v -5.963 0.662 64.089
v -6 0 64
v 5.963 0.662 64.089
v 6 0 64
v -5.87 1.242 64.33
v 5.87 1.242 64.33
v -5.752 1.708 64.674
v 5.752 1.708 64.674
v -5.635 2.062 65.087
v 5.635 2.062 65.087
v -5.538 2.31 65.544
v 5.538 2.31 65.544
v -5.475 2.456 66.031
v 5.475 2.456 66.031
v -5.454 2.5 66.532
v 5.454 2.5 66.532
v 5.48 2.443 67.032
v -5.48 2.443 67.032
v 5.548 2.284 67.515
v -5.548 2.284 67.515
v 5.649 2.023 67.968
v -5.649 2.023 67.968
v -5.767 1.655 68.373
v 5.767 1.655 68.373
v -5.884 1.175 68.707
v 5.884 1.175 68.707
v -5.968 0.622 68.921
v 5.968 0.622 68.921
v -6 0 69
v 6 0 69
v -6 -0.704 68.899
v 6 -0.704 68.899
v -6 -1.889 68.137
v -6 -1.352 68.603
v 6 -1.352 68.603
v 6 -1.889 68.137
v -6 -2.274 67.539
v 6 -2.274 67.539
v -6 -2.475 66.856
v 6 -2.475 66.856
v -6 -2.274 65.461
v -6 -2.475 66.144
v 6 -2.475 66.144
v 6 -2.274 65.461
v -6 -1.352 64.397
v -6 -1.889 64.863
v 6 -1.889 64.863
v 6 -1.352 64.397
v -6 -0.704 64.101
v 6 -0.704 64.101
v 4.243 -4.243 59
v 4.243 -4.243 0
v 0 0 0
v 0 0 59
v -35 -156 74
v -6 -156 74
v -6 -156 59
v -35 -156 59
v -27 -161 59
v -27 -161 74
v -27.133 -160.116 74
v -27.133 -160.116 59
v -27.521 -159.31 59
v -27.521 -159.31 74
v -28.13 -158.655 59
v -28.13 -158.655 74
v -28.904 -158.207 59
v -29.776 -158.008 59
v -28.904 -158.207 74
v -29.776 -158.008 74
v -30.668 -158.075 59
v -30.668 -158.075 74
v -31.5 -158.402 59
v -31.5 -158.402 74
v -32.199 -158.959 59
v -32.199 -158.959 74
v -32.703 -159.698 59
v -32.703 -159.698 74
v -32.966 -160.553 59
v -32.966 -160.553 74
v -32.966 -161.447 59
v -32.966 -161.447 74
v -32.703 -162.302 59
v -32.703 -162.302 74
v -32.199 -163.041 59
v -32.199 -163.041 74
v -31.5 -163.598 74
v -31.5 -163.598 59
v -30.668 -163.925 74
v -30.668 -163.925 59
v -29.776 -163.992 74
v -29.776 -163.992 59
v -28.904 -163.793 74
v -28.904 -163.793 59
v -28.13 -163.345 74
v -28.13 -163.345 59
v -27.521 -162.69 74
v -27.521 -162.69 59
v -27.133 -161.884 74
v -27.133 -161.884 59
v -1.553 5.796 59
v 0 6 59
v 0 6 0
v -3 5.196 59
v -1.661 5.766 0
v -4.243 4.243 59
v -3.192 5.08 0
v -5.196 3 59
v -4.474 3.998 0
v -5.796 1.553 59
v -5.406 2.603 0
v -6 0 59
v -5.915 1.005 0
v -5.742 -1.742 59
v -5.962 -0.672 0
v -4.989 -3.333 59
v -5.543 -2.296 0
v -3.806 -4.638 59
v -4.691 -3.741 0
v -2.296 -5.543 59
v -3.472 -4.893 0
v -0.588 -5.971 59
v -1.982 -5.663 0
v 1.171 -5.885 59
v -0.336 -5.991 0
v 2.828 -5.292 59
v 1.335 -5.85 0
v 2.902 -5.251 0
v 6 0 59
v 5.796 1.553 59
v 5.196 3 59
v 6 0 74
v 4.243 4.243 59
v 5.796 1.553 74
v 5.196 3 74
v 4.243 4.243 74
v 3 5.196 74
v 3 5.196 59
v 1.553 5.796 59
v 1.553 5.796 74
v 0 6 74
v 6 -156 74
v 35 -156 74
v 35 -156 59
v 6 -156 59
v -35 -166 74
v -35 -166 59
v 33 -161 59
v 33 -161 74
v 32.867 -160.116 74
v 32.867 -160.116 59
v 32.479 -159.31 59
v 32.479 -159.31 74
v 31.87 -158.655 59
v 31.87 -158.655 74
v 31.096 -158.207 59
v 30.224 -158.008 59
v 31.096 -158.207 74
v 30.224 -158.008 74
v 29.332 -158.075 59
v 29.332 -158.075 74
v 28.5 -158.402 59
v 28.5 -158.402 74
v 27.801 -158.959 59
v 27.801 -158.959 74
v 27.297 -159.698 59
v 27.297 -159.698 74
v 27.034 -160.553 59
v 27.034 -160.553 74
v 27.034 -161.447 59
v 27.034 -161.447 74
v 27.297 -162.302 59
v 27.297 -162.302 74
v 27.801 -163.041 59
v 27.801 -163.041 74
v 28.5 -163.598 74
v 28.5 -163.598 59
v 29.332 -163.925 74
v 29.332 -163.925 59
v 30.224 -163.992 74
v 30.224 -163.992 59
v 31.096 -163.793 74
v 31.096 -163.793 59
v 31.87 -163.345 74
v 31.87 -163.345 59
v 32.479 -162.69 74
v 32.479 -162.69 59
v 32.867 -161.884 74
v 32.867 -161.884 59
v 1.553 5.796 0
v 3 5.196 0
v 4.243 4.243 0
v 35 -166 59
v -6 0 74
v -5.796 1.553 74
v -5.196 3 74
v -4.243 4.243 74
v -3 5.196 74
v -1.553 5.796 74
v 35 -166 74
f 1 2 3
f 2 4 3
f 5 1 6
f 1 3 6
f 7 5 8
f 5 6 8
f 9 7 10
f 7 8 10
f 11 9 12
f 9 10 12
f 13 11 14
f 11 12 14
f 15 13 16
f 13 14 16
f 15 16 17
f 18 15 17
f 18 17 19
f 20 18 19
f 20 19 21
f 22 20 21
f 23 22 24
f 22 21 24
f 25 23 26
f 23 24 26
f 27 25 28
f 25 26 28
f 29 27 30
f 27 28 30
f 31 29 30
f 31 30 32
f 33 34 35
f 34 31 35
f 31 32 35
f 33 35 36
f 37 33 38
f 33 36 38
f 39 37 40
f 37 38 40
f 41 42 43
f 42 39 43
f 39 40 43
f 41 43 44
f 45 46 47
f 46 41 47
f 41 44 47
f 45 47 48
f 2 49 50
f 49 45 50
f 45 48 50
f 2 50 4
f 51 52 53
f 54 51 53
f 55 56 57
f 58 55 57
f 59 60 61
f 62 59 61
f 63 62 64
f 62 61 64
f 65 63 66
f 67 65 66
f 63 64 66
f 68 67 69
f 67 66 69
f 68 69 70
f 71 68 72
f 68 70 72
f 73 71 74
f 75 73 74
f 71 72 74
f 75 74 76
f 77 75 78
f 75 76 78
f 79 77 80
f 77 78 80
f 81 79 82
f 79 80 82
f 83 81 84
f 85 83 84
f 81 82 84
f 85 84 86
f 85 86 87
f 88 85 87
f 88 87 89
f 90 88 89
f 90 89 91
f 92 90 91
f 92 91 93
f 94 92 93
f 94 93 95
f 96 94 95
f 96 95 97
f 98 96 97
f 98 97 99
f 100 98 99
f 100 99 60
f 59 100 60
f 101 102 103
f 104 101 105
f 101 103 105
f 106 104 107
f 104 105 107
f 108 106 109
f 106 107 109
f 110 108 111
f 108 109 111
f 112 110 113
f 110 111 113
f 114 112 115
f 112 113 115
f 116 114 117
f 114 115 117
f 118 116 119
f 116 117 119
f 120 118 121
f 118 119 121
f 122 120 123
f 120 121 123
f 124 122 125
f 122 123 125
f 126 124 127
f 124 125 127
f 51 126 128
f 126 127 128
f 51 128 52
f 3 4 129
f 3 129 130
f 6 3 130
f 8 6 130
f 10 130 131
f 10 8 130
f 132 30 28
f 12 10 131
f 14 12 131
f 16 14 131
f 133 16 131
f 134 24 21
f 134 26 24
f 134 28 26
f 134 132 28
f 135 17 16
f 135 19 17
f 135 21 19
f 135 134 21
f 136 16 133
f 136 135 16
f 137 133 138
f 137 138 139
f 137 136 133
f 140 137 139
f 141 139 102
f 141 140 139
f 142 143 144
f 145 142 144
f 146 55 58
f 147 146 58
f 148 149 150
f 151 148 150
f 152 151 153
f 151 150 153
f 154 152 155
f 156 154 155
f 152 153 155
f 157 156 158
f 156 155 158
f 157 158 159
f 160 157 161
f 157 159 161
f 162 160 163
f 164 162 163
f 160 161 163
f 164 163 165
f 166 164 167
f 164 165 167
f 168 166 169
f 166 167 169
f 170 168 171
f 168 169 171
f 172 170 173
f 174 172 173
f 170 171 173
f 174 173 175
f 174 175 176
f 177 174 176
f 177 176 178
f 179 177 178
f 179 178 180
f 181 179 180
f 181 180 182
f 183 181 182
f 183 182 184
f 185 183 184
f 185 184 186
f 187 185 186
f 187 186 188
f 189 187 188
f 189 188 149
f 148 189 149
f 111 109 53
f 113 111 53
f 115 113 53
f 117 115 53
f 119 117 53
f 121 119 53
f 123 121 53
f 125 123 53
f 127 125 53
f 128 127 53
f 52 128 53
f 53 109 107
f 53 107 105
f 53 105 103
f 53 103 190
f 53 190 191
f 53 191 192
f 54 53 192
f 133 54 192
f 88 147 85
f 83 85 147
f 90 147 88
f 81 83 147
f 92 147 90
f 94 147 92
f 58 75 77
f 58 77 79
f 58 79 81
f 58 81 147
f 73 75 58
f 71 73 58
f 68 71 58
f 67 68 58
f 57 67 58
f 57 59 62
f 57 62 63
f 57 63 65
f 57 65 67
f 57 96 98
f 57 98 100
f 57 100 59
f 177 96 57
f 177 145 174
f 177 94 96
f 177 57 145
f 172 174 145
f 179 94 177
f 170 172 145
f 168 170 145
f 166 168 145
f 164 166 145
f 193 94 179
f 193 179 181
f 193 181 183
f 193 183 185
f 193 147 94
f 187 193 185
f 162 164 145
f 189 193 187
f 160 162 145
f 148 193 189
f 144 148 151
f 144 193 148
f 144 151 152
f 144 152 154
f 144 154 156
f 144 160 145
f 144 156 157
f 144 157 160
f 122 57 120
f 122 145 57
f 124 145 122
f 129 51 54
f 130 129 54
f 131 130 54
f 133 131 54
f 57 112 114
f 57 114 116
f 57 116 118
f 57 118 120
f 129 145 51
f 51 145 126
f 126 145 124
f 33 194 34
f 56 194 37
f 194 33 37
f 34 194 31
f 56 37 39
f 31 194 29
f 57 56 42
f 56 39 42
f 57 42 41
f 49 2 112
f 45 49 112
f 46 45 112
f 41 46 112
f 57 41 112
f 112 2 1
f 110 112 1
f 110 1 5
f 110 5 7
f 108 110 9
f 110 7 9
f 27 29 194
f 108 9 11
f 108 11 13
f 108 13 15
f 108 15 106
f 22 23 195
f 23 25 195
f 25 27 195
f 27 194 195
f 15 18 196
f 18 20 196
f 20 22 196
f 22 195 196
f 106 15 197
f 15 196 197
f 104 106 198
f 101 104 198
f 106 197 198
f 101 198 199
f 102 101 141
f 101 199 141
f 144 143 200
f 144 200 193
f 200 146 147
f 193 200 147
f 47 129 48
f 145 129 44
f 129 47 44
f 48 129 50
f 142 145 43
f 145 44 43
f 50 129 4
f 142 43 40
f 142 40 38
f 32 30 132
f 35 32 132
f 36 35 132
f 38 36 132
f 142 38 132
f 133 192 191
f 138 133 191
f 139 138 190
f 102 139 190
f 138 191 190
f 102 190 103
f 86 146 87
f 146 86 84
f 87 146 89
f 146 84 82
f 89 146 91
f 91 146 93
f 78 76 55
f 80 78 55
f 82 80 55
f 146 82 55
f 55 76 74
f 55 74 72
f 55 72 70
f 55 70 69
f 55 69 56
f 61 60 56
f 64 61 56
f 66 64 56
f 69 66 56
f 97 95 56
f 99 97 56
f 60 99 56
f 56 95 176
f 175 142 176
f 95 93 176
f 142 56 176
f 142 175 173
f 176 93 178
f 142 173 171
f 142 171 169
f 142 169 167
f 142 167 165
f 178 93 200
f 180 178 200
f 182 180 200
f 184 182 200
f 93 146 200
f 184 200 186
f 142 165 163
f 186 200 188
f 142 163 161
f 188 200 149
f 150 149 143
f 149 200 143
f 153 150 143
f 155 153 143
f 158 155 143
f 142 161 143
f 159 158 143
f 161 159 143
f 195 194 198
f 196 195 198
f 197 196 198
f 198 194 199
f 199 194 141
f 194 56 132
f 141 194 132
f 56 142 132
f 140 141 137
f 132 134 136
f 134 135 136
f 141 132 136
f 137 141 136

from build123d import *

# Parameters (mm, degrees)
BOSS_EXTRU_1_DEPTH      = 59
BOSS_EXTRU_2_DEPTH      = 15
CONG_1_R                = 6
BOSS_EXTRU_3_DEPTH      = 150
ESQUISSE5_W             = 15
ESQUISSE5_H             = 10
BOSS_EXTRU_4_DEPTH      = 35
ENL_V_MAT_EXTRU_1_REACH = 187.086
ESQUISSE6_R             = 3
ENL_V_MAT_EXTRU_2_REACH = 188.314


with BuildPart() as part:
    # Esquisse1 → Boss.-Extru.1 (new body)
    with BuildSketch(Plane.XY):
        with BuildLine():
            Line((4.242640687, -4.242640687), (0, 0))
            Line((0, 0), (0, 6))
            ThreePointArc((0, 6), (-5.543277195, -2.296100594), (4.242640687, -4.242640687))
        make_face()
        with BuildLine():
            Line((0, 6), (0, 0))
            Line((0, 0), (4.242640687, 4.242640687))
            ThreePointArc((4.242640687, 4.242640687), (2.296100594, 5.543277195), (0, 6))
        make_face()
    extrude(amount=BOSS_EXTRU_1_DEPTH)

    # Esquisse2 → Boss.-Extru.2 (add)
    with BuildSketch(Plane.XY.offset(59)):
        with BuildLine():
            ThreePointArc((0, -6), (-4.242640708, -4.242640666), (-6, 5.9e-08))
            Line((-6, 5.9e-08), (-6, -6))
            Line((-6, -6), (0, -6))
        make_face()
        with BuildLine():
            Line((0, 0), (0, 6))
            ThreePointArc((0, 6), (-4.242640666, 4.242640708), (-6, 5.9e-08))
            ThreePointArc((-6, 5.9e-08), (-4.242640708, -4.242640666), (0, -6))
            Line((0, -6), (0, 0))
        make_face()
        with BuildLine():
            ThreePointArc((4.242640687, 4.242640687), (2.296100594, 5.543277195), (0, 6))
            Line((0, 6), (0, 0))
            Line((0, 0), (4.242640687, 4.242640687))
        make_face()
        with BuildLine():
            Line((6, 6), (0, 6))
            ThreePointArc((0, 6), (2.296100594, 5.543277195), (4.242640687, 4.242640687))
            Line((4.242640687, 4.242640687), (0, 0))
            Line((0, 0), (4.242640687, -4.242640687))
            ThreePointArc((4.242640687, -4.242640687), (2.296100594, -5.543277195), (0, -6))
            Line((0, -6), (6, -6))
            Line((6, -6), (6, 6))
        make_face()
        with BuildLine():
            ThreePointArc((-6, 5.9e-08), (-4.242640666, 4.242640708), (0, 6))
            Line((0, 6), (-6, 6))
            Line((-6, 6), (-6, 5.9e-08))
        make_face()
        with BuildLine():
            Line((4.242640687, -4.242640687), (0, 0))
            Line((0, 0), (0, -6))
            ThreePointArc((0, -6), (2.296100594, -5.543277195), (4.242640687, -4.242640687))
        make_face()
    extrude(amount=BOSS_EXTRU_2_DEPTH)

    # Congé1
    cong_1_edges = [part.edges().sort_by_distance(p)[0] for p in [
        (6, 6, 66.5),
        (-6, 6, 66.5),
    ]]
    fillet(cong_1_edges, radius=CONG_1_R - 0.0001)  # a hair under: the kernel refuses the full size

    # Esquisse4 → Boss.-Extru.3 (add)
    with BuildSketch(Plane.XZ.offset(6)):
        Polygon((0, 59), (6, 59), (6, 74), (-6, 74), (-6, 59), align=None)
    extrude(amount=BOSS_EXTRU_3_DEPTH)

    # Esquisse5 → Boss.-Extru.4 (add, symmetric)
    with BuildSketch(Plane(origin=(0, 0, 0), x_dir=(0, 0, -1), z_dir=(1, 0, 0))):
        with Locations((-66.5, -161)):
            Rectangle(ESQUISSE5_W, ESQUISSE5_H)
    extrude(amount=BOSS_EXTRU_4_DEPTH, both=True)

    # Esquisse6 → Enlèv. mat.-Extru.1 (cut, up to next)
    with BuildSketch(Plane.XY.offset(74), mode=Mode.PRIVATE) as enl_v_mat_extru_1_sk1:
        with Locations((-30, -161)):
            Circle(ESQUISSE6_R)
    enl_v_mat_extru_1_tool1 = extrude(enl_v_mat_extru_1_sk1.sketch, amount=-ENL_V_MAT_EXTRU_1_REACH, mode=Mode.PRIVATE) & part.part
    # Esquisse6 → Enlèv. mat.-Extru.1 (cut, up to next)
    with BuildSketch(Plane.XY.offset(74), mode=Mode.PRIVATE) as enl_v_mat_extru_1_sk2:
        with Locations((30, -161)):
            Circle(ESQUISSE6_R)
    enl_v_mat_extru_1_tool2 = extrude(enl_v_mat_extru_1_sk2.sketch, amount=-ENL_V_MAT_EXTRU_1_REACH, mode=Mode.PRIVATE) & part.part
    add(enl_v_mat_extru_1_tool1.solids().sort_by_distance((-30, -161, 74))[0], mode=Mode.SUBTRACT)
    add(enl_v_mat_extru_1_tool2.solids().sort_by_distance((30, -161, 74))[0], mode=Mode.SUBTRACT)

    # Esquisse7 → Enlèv. mat.-Extru.2 (cut, up to next)
    with BuildSketch(Plane(origin=(6, 0, 0), x_dir=(0, 0, -1), z_dir=(1, 0, 0)), mode=Mode.PRIVATE) as enl_v_mat_extru_2_sk1:
        with BuildLine():
            ThreePointArc((-69, 0), (-66.5, -2.5), (-64, 0))
            Line((-64, 0), (-69, 0))
        make_face()
    enl_v_mat_extru_2_tool1 = extrude(enl_v_mat_extru_2_sk1.sketch, amount=-ENL_V_MAT_EXTRU_2_REACH, mode=Mode.PRIVATE) & part.part
    # Esquisse7 → Enlèv. mat.-Extru.2 (cut, up to next)
    with BuildSketch(Plane(origin=(6, 0, 0), x_dir=(0, 0, -1), z_dir=(1, 0, 0)), mode=Mode.PRIVATE) as enl_v_mat_extru_2_sk2:
        with BuildLine():
            Line((-69, 0), (-64, 0))
            ThreePointArc((-64, 0), (-66.5, 2.5), (-69, 0))
        make_face()
    enl_v_mat_extru_2_tool2 = extrude(enl_v_mat_extru_2_sk2.sketch, amount=-ENL_V_MAT_EXTRU_2_REACH, mode=Mode.PRIVATE) & part.part
    # Esquisse7 → Enlèv. mat.-Extru.2 (cut, up to next)
    with BuildSketch(Plane(origin=(6, 0, 0), x_dir=(0, 0, -1), z_dir=(1, 0, 0)), mode=Mode.PRIVATE) as enl_v_mat_extru_2_sk3:
        with BuildLine():
            ThreePointArc((-69, 0), (-66.5, -2.5), (-64, 0))
            Line((-64, 0), (-69, 0))
        make_face()
    enl_v_mat_extru_2_tool3 = extrude(enl_v_mat_extru_2_sk3.sketch, amount=-ENL_V_MAT_EXTRU_2_REACH, mode=Mode.PRIVATE) & part.part
    # Esquisse7 → Enlèv. mat.-Extru.2 (cut, up to next)
    with BuildSketch(Plane(origin=(6, 0, 0), x_dir=(0, 0, -1), z_dir=(1, 0, 0)), mode=Mode.PRIVATE) as enl_v_mat_extru_2_sk4:
        with BuildLine():
            Line((-69, 0), (-64, 0))
            ThreePointArc((-64, 0), (-66.5, 2.5), (-69, 0))
        make_face()
    enl_v_mat_extru_2_tool4 = extrude(enl_v_mat_extru_2_sk4.sketch, amount=-ENL_V_MAT_EXTRU_2_REACH, mode=Mode.PRIVATE) & part.part
    add(enl_v_mat_extru_2_tool1.solids().sort_by_distance((6, -1.061033, 66.5))[0], mode=Mode.SUBTRACT)
    add(enl_v_mat_extru_2_tool2.solids().sort_by_distance((6, 1.061033, 66.5))[0], mode=Mode.SUBTRACT)
    add(enl_v_mat_extru_2_tool3.solids().sort_by_distance((6, -1.061033, 66.5))[0], mode=Mode.SUBTRACT)
    add(enl_v_mat_extru_2_tool4.solids().sort_by_distance((6, 1.061033, 66.5))[0], mode=Mode.SUBTRACT)


solid = part.part
